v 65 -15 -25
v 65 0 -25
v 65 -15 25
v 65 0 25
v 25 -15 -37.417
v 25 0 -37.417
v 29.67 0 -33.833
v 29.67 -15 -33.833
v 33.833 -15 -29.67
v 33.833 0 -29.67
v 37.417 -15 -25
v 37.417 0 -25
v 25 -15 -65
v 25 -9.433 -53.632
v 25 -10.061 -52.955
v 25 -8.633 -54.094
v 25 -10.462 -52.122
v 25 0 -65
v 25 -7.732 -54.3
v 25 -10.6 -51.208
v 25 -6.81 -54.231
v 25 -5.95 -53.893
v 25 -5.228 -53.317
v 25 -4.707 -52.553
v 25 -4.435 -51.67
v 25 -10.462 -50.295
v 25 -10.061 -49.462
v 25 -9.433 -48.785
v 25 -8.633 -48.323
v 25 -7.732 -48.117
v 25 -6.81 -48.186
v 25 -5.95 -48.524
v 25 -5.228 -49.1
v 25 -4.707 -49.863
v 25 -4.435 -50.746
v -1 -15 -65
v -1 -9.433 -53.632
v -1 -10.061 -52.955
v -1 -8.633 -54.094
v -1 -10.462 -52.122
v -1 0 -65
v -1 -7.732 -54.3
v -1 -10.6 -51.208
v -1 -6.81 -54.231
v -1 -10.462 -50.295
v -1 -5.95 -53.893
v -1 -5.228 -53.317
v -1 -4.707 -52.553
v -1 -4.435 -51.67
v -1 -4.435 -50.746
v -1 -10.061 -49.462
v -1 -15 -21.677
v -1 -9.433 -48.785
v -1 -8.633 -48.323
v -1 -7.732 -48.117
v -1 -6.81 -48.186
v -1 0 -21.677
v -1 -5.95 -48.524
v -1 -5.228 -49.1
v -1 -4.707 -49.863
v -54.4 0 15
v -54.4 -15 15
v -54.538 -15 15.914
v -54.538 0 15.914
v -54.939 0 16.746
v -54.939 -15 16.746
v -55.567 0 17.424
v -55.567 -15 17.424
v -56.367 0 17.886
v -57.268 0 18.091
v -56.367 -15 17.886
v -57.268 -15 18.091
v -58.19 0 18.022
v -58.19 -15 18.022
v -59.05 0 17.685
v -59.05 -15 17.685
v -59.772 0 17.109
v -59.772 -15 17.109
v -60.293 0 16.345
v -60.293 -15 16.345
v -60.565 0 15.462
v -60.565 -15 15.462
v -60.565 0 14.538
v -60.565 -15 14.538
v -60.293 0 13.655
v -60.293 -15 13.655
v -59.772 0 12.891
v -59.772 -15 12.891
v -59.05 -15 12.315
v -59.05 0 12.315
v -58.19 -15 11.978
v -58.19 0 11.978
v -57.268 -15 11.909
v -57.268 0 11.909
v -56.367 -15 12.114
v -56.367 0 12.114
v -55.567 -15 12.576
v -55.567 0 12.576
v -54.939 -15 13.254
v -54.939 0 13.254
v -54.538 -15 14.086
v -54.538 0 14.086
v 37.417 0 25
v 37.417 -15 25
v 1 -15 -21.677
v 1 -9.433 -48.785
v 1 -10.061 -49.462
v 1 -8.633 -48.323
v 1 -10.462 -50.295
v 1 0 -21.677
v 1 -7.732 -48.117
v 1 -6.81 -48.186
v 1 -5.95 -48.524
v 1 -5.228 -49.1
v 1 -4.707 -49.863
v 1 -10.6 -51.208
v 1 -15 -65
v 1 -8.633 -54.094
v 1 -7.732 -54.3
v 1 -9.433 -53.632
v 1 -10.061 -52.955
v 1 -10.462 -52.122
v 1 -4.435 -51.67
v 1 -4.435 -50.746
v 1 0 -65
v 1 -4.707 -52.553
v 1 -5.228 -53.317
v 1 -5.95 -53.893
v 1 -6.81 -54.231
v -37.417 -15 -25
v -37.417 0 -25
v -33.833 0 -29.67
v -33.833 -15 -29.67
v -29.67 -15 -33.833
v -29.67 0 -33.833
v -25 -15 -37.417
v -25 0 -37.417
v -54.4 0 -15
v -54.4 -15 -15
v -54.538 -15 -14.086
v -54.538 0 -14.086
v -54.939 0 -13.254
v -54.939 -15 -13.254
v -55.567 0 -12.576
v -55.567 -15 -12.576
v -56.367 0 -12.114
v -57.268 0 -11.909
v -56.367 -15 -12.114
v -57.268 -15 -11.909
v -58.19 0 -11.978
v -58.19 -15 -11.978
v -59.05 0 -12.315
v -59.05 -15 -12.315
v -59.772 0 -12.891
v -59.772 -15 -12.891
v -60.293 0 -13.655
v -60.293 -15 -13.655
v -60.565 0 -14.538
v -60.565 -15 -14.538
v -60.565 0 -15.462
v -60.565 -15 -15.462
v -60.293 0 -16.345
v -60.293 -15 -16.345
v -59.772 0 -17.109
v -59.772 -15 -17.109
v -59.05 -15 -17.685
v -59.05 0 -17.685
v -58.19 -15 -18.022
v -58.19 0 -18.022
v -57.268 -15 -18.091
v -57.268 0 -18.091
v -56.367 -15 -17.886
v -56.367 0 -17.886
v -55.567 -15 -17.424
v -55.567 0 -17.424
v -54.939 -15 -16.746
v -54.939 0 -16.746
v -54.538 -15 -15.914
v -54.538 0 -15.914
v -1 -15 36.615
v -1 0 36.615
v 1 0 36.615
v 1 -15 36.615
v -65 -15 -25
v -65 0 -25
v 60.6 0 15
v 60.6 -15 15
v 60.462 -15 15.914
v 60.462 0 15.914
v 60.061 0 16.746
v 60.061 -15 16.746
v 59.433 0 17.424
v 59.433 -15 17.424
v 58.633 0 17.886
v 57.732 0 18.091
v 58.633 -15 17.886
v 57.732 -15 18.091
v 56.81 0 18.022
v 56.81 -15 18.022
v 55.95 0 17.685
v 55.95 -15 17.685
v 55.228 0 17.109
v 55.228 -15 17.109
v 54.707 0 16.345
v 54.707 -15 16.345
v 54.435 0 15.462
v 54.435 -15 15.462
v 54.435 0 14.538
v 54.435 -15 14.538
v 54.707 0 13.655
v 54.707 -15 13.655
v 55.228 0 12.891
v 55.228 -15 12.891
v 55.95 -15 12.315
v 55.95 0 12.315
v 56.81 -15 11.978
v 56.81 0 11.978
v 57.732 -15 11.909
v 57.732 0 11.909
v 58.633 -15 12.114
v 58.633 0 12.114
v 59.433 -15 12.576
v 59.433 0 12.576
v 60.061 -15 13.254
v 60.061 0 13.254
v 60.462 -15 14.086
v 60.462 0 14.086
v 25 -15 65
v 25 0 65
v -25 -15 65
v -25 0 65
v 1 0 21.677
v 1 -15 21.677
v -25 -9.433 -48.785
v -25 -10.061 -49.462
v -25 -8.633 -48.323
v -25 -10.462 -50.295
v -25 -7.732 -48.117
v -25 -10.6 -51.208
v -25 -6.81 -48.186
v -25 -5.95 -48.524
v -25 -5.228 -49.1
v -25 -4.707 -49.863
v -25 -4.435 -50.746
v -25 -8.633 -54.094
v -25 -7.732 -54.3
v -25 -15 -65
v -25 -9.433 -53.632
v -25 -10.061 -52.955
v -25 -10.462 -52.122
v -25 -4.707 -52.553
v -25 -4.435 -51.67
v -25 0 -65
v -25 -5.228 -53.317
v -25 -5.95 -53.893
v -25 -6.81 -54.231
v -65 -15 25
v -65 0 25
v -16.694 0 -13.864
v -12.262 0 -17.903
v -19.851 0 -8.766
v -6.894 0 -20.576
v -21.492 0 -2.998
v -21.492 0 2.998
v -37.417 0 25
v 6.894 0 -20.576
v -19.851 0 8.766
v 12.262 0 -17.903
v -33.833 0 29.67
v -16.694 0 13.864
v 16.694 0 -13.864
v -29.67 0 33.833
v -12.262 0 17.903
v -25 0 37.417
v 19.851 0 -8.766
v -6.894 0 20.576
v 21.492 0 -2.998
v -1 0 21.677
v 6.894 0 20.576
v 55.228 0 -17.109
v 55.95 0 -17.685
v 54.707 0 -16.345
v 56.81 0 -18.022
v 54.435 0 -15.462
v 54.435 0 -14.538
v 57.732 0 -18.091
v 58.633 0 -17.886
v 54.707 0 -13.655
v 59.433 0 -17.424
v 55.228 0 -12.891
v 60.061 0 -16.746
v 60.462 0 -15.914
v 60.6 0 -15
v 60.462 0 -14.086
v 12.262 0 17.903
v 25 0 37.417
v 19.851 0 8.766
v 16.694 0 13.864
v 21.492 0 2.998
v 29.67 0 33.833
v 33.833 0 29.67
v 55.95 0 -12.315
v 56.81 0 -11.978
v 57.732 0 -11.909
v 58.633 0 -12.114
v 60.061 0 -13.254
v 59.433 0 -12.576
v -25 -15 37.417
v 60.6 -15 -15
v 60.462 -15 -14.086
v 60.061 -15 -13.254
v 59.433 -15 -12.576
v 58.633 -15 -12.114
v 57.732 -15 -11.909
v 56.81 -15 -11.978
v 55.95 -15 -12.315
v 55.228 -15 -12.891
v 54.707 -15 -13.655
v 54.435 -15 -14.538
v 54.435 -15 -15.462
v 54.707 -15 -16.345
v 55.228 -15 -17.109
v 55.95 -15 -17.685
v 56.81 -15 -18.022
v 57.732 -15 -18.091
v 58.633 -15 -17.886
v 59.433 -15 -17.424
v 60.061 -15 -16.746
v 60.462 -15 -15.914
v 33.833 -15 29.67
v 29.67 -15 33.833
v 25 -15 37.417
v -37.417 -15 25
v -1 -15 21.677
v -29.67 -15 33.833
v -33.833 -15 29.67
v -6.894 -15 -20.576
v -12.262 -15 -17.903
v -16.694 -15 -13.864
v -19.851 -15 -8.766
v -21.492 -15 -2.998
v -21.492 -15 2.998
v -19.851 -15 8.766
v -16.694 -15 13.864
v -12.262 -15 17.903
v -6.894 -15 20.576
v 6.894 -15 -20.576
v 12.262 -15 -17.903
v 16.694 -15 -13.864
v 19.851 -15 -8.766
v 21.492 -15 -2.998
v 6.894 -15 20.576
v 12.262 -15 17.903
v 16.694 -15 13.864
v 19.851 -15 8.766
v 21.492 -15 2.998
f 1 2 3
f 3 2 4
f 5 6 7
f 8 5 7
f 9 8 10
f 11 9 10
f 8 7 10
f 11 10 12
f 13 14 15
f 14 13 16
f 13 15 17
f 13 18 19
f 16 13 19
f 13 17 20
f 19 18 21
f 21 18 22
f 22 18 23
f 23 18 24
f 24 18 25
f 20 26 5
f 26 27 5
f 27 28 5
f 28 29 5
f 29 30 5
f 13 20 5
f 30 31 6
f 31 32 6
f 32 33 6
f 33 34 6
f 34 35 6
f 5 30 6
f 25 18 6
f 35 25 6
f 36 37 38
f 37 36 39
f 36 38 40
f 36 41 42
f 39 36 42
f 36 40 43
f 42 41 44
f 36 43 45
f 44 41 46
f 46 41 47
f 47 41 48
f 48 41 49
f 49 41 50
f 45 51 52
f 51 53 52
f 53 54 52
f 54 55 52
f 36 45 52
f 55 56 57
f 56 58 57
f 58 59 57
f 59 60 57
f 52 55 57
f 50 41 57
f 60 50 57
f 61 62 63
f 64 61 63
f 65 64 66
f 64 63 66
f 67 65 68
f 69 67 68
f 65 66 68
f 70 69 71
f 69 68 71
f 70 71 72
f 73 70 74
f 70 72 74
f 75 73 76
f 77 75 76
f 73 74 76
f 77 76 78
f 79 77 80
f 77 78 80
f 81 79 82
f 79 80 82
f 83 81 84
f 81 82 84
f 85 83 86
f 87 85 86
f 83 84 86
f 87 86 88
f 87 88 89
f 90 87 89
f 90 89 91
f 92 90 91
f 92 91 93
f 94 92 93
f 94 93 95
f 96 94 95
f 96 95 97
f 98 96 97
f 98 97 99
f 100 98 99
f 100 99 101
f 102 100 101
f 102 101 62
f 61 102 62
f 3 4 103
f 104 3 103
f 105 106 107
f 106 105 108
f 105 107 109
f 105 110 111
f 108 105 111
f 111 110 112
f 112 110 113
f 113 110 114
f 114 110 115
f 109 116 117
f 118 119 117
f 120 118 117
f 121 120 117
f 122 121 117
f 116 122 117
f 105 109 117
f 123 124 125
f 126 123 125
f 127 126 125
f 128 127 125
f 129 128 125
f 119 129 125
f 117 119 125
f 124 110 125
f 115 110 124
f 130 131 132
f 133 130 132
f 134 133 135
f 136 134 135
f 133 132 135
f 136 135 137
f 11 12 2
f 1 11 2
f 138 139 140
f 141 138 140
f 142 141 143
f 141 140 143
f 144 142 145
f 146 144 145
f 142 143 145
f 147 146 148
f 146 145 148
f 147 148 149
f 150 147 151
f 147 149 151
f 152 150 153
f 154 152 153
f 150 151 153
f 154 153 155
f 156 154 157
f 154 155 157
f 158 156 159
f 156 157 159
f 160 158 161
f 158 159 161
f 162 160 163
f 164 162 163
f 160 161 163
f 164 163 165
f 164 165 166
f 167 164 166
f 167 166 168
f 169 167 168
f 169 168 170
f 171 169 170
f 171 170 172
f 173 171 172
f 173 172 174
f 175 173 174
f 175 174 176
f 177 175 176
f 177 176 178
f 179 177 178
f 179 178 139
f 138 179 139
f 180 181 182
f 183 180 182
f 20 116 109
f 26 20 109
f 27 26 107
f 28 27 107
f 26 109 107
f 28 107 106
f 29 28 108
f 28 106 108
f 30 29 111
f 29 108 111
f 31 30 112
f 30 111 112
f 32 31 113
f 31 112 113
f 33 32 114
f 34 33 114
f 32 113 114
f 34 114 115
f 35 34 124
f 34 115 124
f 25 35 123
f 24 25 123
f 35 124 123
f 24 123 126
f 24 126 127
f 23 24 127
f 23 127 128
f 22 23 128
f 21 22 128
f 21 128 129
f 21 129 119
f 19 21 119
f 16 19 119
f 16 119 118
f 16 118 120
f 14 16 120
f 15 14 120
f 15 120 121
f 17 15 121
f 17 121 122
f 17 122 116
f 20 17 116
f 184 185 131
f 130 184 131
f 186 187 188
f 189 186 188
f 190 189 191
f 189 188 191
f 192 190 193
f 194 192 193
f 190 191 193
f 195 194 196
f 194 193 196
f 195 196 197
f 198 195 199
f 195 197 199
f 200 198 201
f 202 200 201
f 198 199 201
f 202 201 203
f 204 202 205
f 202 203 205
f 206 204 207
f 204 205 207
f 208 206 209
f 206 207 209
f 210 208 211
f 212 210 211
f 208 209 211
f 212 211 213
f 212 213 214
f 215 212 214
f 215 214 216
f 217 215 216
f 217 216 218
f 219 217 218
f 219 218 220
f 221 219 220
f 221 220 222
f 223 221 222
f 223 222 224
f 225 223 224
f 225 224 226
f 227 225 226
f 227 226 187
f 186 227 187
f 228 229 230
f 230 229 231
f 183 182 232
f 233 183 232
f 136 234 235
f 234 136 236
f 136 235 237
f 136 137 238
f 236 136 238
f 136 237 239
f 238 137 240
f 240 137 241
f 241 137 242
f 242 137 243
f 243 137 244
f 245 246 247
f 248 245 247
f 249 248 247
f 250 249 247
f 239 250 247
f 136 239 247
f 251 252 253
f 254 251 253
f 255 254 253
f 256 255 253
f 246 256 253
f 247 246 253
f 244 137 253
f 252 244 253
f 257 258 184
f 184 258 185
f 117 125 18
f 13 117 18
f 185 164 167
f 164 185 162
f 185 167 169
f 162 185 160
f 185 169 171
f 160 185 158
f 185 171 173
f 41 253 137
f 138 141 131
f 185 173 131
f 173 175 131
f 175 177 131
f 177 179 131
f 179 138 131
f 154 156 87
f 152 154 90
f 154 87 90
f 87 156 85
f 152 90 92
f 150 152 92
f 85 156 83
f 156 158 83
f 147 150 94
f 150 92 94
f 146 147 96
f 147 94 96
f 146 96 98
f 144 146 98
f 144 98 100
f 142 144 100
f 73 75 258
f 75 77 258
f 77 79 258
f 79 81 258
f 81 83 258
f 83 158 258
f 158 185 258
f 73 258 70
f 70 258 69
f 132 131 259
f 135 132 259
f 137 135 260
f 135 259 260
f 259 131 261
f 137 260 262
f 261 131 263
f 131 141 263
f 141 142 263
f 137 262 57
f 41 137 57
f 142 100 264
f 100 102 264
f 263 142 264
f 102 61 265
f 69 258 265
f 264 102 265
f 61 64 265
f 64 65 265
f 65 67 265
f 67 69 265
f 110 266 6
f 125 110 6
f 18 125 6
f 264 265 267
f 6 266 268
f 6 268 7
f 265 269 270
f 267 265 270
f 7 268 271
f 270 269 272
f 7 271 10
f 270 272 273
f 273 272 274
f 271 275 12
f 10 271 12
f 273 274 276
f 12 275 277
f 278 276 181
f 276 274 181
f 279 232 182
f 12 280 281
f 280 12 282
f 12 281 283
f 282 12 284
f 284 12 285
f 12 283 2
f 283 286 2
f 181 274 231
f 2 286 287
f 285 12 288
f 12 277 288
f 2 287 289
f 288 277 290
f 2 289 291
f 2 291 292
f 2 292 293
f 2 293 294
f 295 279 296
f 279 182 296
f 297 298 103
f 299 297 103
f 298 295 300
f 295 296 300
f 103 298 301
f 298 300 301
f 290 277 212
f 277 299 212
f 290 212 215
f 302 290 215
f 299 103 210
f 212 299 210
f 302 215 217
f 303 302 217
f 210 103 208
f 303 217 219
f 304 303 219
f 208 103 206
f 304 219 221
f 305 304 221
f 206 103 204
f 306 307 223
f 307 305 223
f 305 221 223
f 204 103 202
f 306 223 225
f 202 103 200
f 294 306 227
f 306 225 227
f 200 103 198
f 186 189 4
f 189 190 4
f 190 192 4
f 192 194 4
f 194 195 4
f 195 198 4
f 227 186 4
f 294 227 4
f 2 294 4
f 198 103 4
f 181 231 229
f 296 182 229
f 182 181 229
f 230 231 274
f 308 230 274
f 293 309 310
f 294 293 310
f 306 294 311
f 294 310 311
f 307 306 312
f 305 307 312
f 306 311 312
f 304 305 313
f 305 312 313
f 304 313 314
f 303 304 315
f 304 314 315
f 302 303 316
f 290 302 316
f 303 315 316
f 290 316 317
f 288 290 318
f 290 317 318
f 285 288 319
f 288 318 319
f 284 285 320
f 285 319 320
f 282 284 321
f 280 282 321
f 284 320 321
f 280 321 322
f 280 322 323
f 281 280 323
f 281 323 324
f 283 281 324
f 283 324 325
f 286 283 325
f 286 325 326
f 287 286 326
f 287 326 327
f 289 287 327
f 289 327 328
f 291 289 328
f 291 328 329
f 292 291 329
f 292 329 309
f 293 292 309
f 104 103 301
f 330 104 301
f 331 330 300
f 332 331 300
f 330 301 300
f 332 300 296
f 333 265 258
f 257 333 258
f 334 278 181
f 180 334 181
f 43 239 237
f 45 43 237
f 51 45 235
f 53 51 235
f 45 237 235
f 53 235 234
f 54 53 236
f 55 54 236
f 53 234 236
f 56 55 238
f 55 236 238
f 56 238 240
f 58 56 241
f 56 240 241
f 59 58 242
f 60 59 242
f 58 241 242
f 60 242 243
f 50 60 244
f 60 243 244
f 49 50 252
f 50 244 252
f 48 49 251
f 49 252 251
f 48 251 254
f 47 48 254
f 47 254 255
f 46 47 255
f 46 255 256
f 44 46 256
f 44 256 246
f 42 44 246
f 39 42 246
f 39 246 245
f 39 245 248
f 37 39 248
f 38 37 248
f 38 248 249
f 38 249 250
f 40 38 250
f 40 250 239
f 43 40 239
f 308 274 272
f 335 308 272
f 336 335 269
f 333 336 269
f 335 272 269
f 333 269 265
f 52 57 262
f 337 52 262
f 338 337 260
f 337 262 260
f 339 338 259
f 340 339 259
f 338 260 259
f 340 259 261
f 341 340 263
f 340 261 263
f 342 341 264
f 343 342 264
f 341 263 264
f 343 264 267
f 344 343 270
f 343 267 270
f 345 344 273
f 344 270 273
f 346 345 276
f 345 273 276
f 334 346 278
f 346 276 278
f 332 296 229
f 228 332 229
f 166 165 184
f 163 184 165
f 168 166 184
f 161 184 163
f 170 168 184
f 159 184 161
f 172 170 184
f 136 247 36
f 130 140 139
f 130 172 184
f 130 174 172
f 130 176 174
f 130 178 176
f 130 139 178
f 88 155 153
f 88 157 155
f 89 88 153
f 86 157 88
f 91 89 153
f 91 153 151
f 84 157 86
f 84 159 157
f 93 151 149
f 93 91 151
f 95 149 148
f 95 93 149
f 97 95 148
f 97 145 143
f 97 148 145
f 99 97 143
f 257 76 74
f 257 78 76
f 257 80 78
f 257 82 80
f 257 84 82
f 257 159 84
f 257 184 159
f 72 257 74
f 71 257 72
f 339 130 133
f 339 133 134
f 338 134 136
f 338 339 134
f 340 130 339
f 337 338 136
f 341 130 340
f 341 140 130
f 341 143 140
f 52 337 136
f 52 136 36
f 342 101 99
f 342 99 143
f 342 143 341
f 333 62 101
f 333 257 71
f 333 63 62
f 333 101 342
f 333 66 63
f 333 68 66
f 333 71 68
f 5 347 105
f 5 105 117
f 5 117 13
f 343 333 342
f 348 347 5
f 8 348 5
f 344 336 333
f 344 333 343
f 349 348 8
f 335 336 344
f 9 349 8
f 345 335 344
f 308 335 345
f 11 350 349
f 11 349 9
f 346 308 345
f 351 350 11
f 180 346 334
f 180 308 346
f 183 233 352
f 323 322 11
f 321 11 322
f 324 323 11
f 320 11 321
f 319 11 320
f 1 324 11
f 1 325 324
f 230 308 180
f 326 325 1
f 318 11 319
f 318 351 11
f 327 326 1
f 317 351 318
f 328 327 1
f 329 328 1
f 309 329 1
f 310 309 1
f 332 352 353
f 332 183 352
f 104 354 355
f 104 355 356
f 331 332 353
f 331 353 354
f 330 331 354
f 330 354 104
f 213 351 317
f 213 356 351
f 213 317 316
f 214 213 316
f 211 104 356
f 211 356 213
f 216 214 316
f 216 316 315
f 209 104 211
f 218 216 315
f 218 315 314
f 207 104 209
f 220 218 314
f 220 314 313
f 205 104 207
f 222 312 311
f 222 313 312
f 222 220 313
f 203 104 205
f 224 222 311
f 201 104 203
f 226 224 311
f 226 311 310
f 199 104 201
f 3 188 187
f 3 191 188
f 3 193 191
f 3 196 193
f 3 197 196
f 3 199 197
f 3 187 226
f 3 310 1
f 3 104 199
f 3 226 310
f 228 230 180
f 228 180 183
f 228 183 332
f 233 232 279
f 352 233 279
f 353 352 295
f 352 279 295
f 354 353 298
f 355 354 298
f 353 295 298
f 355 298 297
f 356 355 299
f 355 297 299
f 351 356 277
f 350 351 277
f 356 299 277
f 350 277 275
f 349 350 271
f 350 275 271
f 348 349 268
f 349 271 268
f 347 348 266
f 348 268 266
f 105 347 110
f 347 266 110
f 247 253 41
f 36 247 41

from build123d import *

# Parameters (mm, degrees)
F1_DEPTH = 15
F2_R     = 3.1
F3_DEPTH = 25
F4_R     = 3.1
F5_DEPTH = 56.6


with BuildPart() as f1:
    # F0 (on Front) → F1 (new body)
    with BuildSketch(Plane.XZ):
        with BuildLine():
            Line((65, 25), (37.416574, 25))
            ThreePointArc((37.416574, 25), (31.819805, 31.819805), (25, 37.416574))
            Line((25, 37.416574), (25, 65))
            Line((25, 65), (1, 65))
            Line((1, 65), (-1, 65))
            Line((-1, 65), (-25, 65))
            Line((-25, 65), (-25, 37.416574))
            ThreePointArc((-25, 37.416574), (-31.819805, 31.819805), (-37.416574, 25))
            Line((-37.416574, 25), (-65, 25))
            Line((-65, 25), (-65, -25))
            Line((-65, -25), (-37.416574, -25))
            ThreePointArc((-37.416574, -25), (-31.819805, -31.819805), (-25, -37.416574))
            Line((-25, -37.416574), (-25, -65))
            Line((-25, -65), (-1, -65))
            Line((-1, -65), (-1, -21.676946))
            ThreePointArc((-1, -21.676946), (-21.7, 0), (-1, 21.676946))
            Line((-1, 21.676946), (-1, 36.615141))
            Line((-1, 36.615141), (1, 36.615141))
            Line((1, 36.615141), (1, 21.676946))
            ThreePointArc((1, 21.676946), (21.7, 0), (1, -21.676946))
            Line((1, -21.676946), (1, -65))
            Line((1, -65), (25, -65))
            Line((25, -65), (25, -37.416574))
            ThreePointArc((25, -37.416574), (31.819805, -31.819805), (37.416574, -25))
            Line((37.416574, -25), (65, -25))
            Line((65, -25), (65, 25))
        make_face()
    extrude(amount=F1_DEPTH)

    # F2 (on face) → F3 (cut)
    with BuildSketch(Plane.XZ.offset(15)):
        with Locations((57.5, 15)):
            Circle(F2_R)
        with Locations((57.5, -15)):
            Circle(F2_R)
        with Locations((-57.5, 15)):
            Circle(F2_R)
        with Locations((-57.5, -15)):
            Circle(F2_R)
    extrude(amount=-F3_DEPTH, mode=Mode.SUBTRACT)

    # F4 (on face) → F5 (cut)
    with BuildSketch(Plane(origin=(-25, 0, 0), x_dir=(0, -1, 0), z_dir=(-1, 0, 0))):
        with Locations((7.5, -51.208287)):
            Circle(F4_R)
    extrude(amount=-F5_DEPTH, mode=Mode.SUBTRACT)


solid = f1.part
